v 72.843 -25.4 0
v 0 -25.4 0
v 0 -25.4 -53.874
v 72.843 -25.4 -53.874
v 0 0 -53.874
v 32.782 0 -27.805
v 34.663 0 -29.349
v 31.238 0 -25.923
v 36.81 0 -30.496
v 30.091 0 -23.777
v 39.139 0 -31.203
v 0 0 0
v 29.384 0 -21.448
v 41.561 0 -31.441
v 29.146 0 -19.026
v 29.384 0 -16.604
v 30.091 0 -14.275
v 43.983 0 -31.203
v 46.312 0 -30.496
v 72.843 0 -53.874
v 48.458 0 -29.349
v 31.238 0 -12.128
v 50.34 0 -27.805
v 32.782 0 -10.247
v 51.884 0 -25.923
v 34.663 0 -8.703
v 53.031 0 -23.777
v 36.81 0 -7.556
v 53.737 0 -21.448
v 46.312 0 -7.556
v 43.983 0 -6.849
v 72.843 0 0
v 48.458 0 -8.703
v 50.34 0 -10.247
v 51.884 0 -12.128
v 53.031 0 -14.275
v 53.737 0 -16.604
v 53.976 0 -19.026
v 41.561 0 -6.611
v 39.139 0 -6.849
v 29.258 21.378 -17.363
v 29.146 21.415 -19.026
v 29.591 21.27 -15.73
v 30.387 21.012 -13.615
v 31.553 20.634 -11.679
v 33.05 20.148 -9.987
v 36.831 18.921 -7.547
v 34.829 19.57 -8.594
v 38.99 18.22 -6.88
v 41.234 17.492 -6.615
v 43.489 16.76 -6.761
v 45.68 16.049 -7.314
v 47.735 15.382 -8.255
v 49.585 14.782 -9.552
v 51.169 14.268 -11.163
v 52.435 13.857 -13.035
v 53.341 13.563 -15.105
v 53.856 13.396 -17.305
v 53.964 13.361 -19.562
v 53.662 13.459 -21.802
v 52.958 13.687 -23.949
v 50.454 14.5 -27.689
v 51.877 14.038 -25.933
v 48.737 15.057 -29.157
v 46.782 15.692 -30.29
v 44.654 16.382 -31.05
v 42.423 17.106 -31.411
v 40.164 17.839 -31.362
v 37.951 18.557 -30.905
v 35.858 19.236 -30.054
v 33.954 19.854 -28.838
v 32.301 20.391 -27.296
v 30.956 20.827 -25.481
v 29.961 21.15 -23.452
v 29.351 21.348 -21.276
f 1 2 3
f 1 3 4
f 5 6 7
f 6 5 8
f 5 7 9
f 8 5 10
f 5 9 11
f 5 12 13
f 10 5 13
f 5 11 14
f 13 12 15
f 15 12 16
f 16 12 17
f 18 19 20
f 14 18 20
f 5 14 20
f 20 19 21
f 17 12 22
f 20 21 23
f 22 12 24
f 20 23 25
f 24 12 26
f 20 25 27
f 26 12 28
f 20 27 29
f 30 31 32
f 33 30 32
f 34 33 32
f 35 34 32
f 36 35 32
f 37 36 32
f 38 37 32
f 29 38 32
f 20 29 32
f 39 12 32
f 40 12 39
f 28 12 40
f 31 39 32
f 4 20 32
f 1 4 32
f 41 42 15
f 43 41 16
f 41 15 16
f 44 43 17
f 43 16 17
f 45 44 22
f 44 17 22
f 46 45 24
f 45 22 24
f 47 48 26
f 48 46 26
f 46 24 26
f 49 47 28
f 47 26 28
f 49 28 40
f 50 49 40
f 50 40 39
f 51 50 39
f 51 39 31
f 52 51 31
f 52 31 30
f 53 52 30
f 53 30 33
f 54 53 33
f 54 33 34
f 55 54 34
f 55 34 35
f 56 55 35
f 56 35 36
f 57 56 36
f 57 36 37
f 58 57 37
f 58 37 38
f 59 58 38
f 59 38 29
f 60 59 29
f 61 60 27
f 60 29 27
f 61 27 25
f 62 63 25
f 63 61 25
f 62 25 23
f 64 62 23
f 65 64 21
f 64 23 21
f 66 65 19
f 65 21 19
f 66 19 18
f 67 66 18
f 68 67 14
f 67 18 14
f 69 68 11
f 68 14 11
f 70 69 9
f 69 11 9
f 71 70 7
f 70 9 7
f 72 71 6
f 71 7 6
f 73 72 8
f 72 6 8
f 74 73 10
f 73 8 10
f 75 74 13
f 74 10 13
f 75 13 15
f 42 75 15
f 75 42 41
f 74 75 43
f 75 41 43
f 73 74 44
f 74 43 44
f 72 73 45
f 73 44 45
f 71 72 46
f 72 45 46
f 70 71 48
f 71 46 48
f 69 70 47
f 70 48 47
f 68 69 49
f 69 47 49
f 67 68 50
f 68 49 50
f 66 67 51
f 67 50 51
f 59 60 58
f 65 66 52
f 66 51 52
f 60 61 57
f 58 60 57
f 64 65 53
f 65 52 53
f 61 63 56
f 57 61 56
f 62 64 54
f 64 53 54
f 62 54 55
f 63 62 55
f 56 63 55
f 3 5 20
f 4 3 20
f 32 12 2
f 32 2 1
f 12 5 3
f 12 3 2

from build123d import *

# Parameters (mm, degrees)
F0_W     = 72.842926
F0_H     = 53.87415
F1_DEPTH = 25.4
F2_R     = 12.415196
F3_DEPTH = 25.4
F5_DEPTH = 40.132


with BuildPart() as f1:
    # F0 (on Front) → F1 (new body)
    with BuildSketch(Plane.XZ):
        with Locations((36.421463, -26.937075)):
            Rectangle(F0_W, F0_H)
    extrude(amount=F1_DEPTH)

    # F2 (on face) → F3 (join)
    with BuildSketch(Plane(origin=(0, 0, 0), x_dir=(-1, 0, 0), z_dir=(0, 1, 0))):
        with Locations((-41.560825, -19.02597)):
            Circle(F2_R)
    extrude(amount=F3_DEPTH)

    # F4 (on Top) → F5 (cut)
    with BuildSketch(Plane.XY):
        Polygon((61.878242, 30.363508), (18.419566, 24.895199), (61.878242, 10.792716), align=None)
    extrude(amount=-F5_DEPTH, mode=Mode.SUBTRACT)


solid = f1.part
